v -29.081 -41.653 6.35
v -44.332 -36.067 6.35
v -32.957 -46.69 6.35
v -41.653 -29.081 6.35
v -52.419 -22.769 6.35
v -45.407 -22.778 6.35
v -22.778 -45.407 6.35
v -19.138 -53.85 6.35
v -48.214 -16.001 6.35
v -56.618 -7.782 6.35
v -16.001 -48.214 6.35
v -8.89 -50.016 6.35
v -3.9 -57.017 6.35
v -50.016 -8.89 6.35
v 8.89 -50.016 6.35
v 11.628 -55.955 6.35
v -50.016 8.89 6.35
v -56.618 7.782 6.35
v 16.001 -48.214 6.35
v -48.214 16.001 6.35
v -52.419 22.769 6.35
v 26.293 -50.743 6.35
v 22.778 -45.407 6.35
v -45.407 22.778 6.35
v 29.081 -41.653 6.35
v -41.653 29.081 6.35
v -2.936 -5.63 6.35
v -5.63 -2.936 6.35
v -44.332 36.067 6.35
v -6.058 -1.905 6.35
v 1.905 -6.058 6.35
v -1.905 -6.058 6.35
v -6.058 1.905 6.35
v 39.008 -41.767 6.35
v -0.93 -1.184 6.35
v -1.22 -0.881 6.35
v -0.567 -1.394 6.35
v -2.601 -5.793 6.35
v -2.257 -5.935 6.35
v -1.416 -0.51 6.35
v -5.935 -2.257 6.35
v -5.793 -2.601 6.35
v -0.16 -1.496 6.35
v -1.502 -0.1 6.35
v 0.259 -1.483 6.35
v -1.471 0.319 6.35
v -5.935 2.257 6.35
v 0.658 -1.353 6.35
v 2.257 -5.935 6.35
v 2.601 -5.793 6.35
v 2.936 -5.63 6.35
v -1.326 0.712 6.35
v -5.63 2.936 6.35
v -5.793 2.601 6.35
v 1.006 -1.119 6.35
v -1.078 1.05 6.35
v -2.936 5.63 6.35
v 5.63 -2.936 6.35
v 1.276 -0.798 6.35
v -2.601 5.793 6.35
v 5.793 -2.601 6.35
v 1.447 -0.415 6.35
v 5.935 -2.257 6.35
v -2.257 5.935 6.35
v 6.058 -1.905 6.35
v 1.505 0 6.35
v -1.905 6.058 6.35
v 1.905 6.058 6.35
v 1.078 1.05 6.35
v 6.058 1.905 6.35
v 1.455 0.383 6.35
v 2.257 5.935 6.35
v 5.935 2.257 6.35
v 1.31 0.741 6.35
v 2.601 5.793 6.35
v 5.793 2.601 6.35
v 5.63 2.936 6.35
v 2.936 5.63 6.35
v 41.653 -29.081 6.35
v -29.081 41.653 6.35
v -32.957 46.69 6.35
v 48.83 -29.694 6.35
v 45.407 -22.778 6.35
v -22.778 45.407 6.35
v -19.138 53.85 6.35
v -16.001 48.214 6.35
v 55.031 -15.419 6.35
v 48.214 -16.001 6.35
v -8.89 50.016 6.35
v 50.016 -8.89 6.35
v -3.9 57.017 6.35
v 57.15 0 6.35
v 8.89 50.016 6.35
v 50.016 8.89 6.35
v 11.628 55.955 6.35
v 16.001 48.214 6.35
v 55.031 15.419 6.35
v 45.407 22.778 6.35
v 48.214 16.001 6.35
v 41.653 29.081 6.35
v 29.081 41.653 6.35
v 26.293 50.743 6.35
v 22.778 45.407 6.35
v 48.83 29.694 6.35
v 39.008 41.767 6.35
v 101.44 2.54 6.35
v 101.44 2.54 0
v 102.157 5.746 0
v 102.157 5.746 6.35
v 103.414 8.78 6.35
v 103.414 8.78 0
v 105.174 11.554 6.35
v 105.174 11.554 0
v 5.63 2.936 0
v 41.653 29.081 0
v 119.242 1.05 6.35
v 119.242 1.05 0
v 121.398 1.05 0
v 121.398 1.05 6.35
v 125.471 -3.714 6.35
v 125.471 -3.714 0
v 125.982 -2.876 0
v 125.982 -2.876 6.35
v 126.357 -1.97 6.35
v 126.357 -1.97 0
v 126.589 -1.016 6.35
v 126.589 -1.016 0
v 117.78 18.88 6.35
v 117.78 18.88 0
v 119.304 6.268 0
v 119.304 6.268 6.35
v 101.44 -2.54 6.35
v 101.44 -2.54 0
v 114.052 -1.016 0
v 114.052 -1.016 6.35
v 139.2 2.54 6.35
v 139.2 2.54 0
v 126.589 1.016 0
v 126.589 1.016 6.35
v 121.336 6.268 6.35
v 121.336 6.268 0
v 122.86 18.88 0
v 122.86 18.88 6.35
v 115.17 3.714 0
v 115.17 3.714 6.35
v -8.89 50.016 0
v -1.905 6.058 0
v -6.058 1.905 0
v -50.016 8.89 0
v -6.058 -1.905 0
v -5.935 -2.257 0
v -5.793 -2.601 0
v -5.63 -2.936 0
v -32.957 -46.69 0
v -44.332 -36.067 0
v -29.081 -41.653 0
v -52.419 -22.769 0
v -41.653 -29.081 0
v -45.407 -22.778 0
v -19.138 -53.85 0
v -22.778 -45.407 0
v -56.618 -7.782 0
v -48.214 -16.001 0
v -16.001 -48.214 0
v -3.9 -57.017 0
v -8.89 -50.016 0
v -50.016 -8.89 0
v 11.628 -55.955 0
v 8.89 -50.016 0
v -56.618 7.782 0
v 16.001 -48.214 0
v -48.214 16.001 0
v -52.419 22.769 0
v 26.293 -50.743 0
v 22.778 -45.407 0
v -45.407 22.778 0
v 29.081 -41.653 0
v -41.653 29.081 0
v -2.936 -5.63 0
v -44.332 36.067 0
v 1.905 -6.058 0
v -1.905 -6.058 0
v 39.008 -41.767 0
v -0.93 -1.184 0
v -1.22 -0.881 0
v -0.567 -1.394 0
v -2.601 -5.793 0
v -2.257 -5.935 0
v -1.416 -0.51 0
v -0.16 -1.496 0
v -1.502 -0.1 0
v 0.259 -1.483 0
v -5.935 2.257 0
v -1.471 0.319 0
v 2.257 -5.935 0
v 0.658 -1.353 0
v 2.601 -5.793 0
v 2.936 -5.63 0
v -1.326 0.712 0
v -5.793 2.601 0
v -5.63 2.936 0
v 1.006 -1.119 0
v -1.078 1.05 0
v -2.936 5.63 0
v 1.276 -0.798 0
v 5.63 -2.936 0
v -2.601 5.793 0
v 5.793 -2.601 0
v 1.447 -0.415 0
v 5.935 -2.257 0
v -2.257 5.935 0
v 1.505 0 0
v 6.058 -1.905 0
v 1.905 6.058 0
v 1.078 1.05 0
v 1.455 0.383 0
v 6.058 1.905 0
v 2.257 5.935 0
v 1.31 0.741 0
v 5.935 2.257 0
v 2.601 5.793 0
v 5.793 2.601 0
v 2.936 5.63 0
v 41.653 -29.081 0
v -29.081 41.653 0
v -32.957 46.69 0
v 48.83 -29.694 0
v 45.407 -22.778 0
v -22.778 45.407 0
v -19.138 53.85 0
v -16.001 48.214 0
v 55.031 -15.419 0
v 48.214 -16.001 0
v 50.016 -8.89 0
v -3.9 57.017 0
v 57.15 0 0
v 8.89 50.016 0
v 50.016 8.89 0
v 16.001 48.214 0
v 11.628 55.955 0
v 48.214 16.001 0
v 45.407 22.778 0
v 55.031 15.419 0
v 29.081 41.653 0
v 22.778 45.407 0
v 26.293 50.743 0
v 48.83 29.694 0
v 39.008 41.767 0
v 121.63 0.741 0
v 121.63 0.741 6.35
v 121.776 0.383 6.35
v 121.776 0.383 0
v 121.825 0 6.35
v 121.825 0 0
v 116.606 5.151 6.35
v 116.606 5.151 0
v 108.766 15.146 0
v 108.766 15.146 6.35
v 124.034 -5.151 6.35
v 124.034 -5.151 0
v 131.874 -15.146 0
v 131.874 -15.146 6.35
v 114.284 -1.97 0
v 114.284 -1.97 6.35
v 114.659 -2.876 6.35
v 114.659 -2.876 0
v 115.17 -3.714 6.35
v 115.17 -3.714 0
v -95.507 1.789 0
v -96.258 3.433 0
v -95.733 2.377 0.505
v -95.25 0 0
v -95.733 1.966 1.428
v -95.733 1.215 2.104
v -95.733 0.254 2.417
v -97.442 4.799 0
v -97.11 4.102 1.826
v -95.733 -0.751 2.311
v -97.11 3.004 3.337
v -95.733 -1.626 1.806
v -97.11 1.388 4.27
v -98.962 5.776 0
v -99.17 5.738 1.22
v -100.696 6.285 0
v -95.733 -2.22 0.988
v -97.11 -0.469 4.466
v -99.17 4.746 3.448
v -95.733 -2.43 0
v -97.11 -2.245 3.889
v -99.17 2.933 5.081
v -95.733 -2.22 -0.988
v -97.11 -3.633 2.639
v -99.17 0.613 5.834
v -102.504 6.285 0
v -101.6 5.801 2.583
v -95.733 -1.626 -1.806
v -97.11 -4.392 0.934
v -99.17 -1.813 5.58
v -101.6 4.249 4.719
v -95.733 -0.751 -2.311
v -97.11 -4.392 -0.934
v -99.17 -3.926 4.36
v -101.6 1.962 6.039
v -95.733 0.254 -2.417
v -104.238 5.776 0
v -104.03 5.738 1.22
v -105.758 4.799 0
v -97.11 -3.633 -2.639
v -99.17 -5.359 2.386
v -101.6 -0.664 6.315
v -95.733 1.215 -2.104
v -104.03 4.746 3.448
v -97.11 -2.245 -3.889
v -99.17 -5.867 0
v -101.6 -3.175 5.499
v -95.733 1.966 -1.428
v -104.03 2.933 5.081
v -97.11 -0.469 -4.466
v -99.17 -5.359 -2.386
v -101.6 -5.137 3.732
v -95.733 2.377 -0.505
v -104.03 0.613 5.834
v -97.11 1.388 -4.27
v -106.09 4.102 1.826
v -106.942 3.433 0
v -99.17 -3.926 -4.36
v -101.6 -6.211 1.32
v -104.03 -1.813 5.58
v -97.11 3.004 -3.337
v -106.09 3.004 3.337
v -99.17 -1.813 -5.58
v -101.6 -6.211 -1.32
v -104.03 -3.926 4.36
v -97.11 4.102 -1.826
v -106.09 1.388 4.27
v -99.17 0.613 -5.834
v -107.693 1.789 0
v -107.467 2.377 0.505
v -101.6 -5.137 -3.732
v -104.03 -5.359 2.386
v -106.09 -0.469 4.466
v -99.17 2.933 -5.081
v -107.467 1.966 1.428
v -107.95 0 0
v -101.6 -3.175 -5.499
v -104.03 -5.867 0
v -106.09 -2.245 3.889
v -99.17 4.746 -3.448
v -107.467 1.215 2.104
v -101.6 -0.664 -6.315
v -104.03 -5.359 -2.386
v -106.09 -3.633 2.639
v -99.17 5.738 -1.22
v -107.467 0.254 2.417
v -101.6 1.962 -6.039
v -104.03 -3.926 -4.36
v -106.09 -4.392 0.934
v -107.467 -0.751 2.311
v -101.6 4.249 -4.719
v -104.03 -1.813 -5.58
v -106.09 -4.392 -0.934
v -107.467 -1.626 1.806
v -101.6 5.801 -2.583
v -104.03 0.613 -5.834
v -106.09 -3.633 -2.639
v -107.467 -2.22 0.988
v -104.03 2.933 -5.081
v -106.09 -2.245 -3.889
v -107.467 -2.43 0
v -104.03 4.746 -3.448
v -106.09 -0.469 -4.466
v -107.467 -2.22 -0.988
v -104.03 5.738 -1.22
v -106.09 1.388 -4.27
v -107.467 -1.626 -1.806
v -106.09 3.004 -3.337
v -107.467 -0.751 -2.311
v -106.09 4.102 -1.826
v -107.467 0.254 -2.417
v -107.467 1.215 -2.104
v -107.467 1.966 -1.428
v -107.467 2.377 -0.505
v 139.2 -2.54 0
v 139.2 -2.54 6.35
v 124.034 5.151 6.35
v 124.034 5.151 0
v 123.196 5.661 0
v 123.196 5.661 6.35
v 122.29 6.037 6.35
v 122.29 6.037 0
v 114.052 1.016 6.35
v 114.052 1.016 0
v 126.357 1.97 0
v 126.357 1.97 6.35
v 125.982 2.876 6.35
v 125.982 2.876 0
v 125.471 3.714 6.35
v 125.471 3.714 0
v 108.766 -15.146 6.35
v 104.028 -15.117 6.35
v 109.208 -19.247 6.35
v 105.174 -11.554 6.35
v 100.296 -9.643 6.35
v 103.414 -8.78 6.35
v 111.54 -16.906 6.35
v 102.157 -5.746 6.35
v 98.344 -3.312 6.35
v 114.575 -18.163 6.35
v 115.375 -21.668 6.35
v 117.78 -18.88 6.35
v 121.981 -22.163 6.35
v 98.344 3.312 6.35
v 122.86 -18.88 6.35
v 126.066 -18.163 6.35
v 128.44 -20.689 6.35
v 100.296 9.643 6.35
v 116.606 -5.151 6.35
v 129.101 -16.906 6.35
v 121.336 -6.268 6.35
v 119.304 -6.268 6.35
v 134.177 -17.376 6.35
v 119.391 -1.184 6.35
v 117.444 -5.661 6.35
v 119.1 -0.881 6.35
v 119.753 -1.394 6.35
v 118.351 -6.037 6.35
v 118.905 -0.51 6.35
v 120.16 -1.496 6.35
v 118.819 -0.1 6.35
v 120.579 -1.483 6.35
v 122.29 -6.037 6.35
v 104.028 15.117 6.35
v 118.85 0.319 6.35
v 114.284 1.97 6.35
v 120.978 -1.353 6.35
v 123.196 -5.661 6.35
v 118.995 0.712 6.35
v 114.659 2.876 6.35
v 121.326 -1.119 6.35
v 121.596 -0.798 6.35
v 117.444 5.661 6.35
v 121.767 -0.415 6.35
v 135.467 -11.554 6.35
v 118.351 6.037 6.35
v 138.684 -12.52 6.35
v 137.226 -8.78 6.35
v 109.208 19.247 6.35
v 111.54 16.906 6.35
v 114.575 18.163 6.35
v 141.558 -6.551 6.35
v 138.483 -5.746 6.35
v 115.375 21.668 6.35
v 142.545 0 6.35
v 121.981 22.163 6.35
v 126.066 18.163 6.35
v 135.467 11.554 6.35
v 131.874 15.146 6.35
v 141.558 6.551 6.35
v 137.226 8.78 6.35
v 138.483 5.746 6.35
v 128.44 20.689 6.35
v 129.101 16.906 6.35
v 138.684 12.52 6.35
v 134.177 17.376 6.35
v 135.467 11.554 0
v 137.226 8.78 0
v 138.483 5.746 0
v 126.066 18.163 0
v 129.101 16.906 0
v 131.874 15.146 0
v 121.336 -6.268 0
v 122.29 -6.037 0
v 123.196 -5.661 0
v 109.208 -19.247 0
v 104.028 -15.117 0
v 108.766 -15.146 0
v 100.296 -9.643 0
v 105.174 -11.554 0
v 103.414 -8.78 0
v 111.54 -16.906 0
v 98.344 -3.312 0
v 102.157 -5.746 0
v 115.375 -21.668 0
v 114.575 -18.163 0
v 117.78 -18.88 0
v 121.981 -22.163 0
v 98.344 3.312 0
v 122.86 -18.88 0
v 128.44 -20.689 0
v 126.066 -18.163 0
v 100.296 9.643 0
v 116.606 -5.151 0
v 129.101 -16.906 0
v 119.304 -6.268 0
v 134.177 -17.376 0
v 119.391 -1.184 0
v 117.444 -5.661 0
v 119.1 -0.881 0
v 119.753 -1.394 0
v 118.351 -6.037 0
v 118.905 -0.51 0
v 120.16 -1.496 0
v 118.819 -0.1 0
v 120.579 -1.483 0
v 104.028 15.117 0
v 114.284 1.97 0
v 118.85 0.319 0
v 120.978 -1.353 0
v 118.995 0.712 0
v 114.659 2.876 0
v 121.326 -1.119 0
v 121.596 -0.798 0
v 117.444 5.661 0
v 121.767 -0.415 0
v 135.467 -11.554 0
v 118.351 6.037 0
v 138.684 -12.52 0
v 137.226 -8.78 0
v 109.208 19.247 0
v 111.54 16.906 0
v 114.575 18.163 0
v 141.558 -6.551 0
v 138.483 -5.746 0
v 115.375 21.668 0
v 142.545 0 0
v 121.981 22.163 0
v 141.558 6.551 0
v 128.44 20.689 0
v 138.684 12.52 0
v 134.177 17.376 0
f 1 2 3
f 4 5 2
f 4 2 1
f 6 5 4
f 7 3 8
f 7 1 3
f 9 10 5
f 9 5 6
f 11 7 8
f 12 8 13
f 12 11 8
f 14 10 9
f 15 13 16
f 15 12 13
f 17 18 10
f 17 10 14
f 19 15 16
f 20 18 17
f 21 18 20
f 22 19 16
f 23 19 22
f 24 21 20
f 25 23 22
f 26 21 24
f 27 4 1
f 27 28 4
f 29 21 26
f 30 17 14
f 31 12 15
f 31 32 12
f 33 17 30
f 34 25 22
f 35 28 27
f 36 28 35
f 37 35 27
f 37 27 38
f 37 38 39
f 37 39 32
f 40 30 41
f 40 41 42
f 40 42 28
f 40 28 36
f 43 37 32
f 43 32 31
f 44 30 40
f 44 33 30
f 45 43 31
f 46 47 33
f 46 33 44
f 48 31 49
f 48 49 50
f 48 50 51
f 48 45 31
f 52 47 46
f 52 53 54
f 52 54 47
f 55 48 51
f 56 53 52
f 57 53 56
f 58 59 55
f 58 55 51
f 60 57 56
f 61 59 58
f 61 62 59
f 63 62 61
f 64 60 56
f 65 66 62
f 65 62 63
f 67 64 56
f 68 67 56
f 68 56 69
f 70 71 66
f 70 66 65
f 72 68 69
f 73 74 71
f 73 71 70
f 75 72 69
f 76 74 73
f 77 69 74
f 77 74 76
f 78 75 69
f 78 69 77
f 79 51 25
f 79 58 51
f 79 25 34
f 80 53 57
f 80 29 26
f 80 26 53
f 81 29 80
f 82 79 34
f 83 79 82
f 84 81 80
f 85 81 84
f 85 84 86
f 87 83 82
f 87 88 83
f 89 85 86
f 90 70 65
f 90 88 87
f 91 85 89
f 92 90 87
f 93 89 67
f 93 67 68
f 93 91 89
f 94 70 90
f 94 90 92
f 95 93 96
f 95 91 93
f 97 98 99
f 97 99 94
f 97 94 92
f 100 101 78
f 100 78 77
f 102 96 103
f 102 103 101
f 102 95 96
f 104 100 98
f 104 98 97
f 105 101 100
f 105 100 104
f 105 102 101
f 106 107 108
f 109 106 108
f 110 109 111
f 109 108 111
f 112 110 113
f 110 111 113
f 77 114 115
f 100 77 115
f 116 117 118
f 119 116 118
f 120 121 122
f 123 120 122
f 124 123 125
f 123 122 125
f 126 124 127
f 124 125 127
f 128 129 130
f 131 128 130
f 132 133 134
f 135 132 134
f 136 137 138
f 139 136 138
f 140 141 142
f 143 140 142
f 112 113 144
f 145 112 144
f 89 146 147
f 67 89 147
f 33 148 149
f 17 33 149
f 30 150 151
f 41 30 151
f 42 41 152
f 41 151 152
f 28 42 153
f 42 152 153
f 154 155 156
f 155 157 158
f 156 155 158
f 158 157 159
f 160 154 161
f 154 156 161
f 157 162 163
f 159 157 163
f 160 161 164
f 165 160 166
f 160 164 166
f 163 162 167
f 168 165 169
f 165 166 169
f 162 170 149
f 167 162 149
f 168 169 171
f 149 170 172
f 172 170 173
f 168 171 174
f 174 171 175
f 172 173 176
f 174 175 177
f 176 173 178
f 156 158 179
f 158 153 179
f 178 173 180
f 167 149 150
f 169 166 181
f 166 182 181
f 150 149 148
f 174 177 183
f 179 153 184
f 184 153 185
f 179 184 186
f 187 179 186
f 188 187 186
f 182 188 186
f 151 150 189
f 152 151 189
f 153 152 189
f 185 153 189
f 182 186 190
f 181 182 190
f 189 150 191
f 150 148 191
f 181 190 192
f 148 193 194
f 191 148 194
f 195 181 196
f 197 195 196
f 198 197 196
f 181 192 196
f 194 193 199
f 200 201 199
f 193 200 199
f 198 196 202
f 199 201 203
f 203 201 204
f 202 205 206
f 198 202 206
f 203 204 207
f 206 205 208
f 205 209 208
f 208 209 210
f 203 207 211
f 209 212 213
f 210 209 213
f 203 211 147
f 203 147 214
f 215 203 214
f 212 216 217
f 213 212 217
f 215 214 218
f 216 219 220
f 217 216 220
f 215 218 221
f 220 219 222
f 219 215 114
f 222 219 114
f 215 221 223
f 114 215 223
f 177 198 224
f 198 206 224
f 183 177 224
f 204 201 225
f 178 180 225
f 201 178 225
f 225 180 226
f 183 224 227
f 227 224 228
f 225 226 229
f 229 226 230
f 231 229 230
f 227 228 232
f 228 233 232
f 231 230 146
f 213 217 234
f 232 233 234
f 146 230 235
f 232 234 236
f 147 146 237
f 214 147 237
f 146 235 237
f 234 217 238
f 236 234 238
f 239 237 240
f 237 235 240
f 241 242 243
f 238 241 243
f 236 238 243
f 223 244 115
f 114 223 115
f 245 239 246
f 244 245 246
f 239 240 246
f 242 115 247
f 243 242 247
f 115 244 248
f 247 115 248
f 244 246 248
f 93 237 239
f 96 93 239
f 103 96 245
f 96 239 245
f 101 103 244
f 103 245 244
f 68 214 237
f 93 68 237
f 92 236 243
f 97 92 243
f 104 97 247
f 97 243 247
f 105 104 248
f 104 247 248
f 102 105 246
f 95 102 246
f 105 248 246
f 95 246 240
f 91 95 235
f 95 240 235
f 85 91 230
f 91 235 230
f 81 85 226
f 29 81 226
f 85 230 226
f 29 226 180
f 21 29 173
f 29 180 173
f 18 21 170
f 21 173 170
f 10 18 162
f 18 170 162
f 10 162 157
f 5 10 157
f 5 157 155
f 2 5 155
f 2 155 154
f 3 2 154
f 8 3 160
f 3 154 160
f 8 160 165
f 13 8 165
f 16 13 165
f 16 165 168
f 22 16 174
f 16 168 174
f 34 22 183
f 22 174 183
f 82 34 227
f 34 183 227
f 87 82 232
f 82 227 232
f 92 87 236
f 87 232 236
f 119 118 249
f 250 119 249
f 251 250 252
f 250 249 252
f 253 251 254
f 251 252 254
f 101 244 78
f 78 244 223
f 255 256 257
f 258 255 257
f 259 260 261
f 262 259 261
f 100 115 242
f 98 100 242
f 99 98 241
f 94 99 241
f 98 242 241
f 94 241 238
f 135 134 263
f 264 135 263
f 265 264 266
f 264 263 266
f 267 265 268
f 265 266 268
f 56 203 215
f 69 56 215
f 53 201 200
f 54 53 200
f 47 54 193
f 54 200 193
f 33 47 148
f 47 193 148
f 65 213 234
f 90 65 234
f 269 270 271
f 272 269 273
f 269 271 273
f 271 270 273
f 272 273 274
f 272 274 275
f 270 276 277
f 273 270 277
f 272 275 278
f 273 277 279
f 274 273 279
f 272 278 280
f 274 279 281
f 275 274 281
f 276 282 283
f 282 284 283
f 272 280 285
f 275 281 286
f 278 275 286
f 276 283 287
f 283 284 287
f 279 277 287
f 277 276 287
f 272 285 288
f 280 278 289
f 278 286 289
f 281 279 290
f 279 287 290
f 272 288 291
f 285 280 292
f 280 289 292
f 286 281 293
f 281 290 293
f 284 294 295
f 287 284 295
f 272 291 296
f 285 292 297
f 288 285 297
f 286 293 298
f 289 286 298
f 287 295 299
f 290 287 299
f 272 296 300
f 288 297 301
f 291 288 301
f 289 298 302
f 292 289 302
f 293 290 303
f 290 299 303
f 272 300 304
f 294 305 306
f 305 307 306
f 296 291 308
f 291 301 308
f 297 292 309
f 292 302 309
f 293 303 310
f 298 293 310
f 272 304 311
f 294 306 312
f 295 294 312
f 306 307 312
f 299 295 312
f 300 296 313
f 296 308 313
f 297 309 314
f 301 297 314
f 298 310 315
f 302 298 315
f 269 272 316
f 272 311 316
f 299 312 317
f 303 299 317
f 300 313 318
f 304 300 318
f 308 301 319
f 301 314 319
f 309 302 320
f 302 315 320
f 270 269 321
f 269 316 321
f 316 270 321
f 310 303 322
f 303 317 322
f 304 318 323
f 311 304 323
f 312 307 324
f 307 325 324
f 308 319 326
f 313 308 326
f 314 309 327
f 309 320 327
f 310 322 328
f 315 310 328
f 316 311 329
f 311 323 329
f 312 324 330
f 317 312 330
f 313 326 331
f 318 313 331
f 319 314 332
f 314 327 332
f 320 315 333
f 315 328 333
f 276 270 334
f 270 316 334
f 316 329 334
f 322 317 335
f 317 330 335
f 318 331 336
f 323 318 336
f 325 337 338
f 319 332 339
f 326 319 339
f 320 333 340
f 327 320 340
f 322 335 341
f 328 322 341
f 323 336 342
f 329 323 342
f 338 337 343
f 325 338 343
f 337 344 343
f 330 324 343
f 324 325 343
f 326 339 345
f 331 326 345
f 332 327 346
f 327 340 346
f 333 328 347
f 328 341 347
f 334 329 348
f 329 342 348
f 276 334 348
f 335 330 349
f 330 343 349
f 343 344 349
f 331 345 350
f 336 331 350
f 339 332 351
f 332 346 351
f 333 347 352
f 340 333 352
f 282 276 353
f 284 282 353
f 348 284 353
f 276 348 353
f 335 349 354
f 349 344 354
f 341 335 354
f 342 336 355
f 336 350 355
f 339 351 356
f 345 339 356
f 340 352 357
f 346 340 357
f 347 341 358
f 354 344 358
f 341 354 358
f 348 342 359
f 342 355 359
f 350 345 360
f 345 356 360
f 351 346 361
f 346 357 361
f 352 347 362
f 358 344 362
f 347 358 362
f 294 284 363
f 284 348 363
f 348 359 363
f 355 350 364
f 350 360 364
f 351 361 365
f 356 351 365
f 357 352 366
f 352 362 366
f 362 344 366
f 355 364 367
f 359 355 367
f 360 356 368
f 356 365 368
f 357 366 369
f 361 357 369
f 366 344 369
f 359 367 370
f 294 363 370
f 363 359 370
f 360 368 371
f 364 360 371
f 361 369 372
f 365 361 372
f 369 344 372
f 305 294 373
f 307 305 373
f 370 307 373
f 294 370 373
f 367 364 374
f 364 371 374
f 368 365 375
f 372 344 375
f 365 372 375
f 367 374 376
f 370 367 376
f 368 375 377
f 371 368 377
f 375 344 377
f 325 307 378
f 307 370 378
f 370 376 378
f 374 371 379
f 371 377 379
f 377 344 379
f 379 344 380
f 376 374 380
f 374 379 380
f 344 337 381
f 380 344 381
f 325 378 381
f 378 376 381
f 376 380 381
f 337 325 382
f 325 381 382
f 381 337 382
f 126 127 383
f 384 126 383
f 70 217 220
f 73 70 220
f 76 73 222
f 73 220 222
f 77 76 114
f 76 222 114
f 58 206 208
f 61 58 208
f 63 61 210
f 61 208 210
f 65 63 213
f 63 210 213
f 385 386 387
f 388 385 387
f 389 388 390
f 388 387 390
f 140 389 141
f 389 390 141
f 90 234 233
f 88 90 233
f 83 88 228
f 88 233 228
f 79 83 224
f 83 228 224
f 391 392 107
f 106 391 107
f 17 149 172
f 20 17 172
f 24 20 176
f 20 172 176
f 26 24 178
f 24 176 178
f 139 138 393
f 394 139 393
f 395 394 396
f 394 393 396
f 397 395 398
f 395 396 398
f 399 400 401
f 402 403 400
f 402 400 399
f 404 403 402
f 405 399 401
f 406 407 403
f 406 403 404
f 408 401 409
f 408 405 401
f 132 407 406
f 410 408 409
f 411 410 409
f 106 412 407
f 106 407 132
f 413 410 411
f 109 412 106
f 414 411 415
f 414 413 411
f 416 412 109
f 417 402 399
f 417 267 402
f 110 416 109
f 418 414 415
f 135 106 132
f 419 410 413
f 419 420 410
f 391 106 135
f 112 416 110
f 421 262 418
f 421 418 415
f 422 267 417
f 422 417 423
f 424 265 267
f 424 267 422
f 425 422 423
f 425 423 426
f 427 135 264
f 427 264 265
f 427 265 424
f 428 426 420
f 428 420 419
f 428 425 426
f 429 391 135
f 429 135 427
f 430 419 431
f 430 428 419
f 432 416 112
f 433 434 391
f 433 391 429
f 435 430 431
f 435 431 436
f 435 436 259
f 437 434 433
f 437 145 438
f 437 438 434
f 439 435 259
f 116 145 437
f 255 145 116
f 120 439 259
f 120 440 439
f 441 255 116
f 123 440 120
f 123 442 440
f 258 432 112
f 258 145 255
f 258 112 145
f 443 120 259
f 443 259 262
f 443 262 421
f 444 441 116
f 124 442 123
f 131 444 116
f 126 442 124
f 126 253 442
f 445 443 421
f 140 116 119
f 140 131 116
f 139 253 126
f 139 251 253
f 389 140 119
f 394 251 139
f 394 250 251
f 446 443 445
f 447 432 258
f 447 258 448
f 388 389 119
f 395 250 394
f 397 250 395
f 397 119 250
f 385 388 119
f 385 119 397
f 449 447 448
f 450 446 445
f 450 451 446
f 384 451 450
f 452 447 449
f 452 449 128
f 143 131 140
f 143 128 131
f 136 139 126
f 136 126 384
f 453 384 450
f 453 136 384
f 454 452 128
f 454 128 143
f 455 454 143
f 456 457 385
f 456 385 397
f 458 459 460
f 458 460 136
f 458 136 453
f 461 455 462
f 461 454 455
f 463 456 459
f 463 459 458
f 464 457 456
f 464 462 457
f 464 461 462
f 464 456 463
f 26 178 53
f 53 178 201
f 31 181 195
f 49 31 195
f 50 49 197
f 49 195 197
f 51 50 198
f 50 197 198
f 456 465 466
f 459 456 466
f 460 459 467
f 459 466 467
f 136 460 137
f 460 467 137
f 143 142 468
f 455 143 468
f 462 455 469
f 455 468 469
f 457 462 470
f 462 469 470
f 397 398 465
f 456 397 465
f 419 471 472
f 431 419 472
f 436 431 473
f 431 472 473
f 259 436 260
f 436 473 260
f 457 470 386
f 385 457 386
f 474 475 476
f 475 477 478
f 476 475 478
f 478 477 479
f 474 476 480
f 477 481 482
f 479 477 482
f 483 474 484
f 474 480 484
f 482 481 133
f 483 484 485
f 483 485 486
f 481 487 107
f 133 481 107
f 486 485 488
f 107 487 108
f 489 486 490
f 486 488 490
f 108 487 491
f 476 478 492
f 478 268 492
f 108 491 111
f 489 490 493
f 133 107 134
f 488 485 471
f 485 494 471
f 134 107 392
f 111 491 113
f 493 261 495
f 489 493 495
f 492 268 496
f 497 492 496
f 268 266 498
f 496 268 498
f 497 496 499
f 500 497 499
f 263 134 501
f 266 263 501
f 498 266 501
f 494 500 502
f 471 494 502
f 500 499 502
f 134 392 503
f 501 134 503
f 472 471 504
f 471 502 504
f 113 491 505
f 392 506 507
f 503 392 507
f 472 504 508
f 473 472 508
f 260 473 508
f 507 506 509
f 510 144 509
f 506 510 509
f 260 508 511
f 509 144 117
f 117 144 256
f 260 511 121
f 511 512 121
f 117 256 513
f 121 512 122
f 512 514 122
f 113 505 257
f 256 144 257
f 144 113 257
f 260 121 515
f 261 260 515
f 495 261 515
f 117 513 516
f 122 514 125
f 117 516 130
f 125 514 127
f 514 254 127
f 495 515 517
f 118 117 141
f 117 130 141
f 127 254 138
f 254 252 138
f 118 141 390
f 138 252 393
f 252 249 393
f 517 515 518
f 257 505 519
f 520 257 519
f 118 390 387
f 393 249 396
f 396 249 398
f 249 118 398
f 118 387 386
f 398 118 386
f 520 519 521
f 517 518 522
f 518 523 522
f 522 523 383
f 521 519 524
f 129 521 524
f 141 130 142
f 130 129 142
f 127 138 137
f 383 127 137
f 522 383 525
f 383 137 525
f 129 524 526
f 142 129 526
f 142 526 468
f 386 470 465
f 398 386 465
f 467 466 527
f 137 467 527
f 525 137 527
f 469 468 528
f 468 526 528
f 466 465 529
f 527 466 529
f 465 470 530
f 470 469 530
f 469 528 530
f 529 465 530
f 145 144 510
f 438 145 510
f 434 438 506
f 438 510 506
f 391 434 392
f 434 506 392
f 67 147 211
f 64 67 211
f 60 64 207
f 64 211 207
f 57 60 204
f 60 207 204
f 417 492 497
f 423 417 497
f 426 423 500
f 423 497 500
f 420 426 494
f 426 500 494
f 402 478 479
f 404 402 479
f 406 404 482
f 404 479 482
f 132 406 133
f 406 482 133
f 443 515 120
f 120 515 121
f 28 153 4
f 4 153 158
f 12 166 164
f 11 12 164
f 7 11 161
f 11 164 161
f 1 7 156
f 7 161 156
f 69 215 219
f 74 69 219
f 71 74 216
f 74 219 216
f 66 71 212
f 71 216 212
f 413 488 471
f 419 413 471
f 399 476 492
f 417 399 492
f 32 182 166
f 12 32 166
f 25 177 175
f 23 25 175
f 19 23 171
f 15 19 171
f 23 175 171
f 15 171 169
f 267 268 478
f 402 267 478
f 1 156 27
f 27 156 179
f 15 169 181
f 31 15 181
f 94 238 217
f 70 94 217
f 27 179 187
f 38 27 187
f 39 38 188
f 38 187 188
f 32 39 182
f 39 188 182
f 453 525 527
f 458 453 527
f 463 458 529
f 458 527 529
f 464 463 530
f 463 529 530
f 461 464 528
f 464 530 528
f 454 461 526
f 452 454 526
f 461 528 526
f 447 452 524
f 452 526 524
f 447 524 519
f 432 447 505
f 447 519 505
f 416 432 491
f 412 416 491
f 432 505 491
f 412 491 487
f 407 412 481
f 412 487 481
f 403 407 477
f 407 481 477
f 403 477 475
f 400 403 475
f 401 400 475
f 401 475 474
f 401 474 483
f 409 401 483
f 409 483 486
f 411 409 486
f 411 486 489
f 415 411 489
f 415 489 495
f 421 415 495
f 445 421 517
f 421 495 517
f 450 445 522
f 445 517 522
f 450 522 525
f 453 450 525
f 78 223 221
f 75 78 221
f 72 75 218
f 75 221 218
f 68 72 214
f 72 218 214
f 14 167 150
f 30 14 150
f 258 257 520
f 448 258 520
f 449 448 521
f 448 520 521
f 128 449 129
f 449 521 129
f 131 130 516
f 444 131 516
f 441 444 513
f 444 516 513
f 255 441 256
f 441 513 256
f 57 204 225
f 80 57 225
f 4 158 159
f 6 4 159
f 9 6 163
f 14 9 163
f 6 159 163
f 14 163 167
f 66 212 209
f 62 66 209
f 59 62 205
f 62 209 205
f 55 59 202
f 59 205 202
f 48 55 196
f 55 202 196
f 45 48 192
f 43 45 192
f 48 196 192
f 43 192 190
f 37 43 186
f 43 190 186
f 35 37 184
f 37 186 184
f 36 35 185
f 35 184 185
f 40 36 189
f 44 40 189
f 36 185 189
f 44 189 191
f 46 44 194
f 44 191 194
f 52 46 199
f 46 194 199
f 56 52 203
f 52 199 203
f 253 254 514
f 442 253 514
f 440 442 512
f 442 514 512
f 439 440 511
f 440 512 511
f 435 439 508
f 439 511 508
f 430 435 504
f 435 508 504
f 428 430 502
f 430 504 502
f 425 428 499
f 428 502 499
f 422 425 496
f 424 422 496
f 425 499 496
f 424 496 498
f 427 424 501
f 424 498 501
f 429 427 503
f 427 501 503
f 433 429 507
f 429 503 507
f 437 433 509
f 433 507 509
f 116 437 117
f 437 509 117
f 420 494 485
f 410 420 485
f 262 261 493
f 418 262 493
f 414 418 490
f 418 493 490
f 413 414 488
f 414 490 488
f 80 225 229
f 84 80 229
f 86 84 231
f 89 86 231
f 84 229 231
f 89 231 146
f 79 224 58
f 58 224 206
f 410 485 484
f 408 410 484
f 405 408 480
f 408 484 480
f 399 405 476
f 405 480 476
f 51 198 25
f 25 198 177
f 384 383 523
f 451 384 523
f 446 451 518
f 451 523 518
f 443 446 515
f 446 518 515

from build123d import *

# Parameters (mm, degrees)
F0_R     = 57.15
F1_DEPTH = 6.35
F0_R_2   = 22.225


with BuildPart() as f1:
    # F0 (on Top) → F1 (new body)
    with BuildSketch(Plane.XY):
        Circle(F0_R)
        with BuildLine():
            ThreePointArc((41.6528860865, 29.080527517), (46.9330802516, 19.4403183641), (50.0160764155, 8.89))
            ThreePointArc((50.0160764155, 8.89), (50.6036396018, 4.4622482054), (50.8, 0))
            ThreePointArc((50.8, 0), (50.6036396018, -4.4622482054), (50.0160764155, -8.89))
            ThreePointArc((50.0160764155, -8.89), (46.9330802516, -19.4403183641), (41.6528860865, -29.080527517))
            ThreePointArc((41.6528860865, -29.080527517), (35.9210244843, -35.9210244843), (29.080527517, -41.6528860865))
            ThreePointArc((29.080527517, -41.6528860865), (19.4403183641, -46.9330802516), (8.89, -50.0160764155))
            ThreePointArc((8.89, -50.0160764155), (0, -50.8), (-8.89, -50.0160764155))
            ThreePointArc((-8.89, -50.0160764155), (-19.4403183641, -46.9330802516), (-29.080527517, -41.6528860865))
            ThreePointArc((-29.080527517, -41.6528860865), (-35.9210244843, -35.9210244843), (-41.6528860865, -29.080527517))
            ThreePointArc((-41.6528860865, -29.080527517), (-46.9330802516, -19.4403183641), (-50.0160764155, -8.89))
            ThreePointArc((-50.0160764155, -8.89), (-50.8, 0), (-50.0160764155, 8.89))
            ThreePointArc((-50.0160764155, 8.89), (-46.9330802516, 19.4403183641), (-41.6528860865, 29.080527517))
            ThreePointArc((-41.6528860865, 29.080527517), (-35.9210244843, 35.9210244843), (-29.080527517, 41.6528860865))
            ThreePointArc((-29.080527517, 41.6528860865), (-19.4403183641, 46.9330802516), (-8.89, 50.0160764155))
            ThreePointArc((-8.89, 50.0160764155), (0, 50.8), (8.89, 50.0160764155))
            ThreePointArc((8.89, 50.0160764155), (19.4403183641, 46.9330802516), (29.080527517, 41.6528860865))
            ThreePointArc((29.080527517, 41.6528860865), (35.9210244843, 35.9210244843), (41.6528860865, 29.080527517))
        make_face(mode=Mode.SUBTRACT)
        with BuildLine():
            ThreePointArc((-5.6303475945, 2.9362707582), (-4.4901280605, 4.4901280605), (-2.9362707582, 5.6303475945))
            Line((-2.9362707582, 5.6303475945), (-29.080527517, 41.6528860865))
            ThreePointArc((-29.080527517, 41.6528860865), (-35.9210244843, 35.9210244843), (-41.6528860865, 29.080527517))
            Line((-41.6528860865, 29.080527517), (-5.6303475945, 2.9362707582))
        make_face()
        with BuildLine():
            ThreePointArc((6.057513929, -1.905), (6.2764525589, -0.9636613904), (6.35, 0))
            ThreePointArc((6.35, 0), (6.2764525589, 0.9636613904), (6.057513929, 1.905))
            ThreePointArc((6.057513929, 1.905), (5.8666350314, 2.4300397955), (5.6303475945, 2.9362707582))
            ThreePointArc((5.6303475945, 2.9362707582), (4.4901280605, 4.4901280605), (2.9362707582, 5.6303475945))
            ThreePointArc((2.9362707582, 5.6303475945), (2.4300397955, 5.8666350314), (1.905, 6.057513929))
            ThreePointArc((1.905, 6.057513929), (0, 6.35), (-1.905, 6.057513929))
            ThreePointArc((-1.905, 6.057513929), (-2.4300397955, 5.8666350314), (-2.9362707582, 5.6303475945))
            ThreePointArc((-2.9362707582, 5.6303475945), (-4.4901280605, 4.4901280605), (-5.6303475945, 2.9362707582))
            ThreePointArc((-5.6303475945, 2.9362707582), (-5.8666350314, 2.4300397955), (-6.057513929, 1.905))
            ThreePointArc((-6.057513929, 1.905), (-6.35, 0), (-6.057513929, -1.905))
            ThreePointArc((-6.057513929, -1.905), (-5.8666350314, -2.4300397955), (-5.6303475945, -2.9362707582))
            ThreePointArc((-5.6303475945, -2.9362707582), (-4.4901280605, -4.4901280605), (-2.9362707582, -5.6303475945))
            ThreePointArc((-2.9362707582, -5.6303475945), (-2.4300397955, -5.8666350314), (-1.905, -6.057513929))
            ThreePointArc((-1.905, -6.057513929), (0, -6.35), (1.905, -6.057513929))
            ThreePointArc((1.905, -6.057513929), (2.4300397955, -5.8666350314), (2.9362707582, -5.6303475945))
            ThreePointArc((2.9362707582, -5.6303475945), (4.4901280605, -4.4901280605), (5.6303475945, -2.9362707582))
            ThreePointArc((5.6303475945, -2.9362707582), (5.8666350314, -2.4300397955), (6.057513929, -1.905))
        make_face()
        with BuildLine():
            ThreePointArc((1.0778522248, 1.05029), (1.3940925737, 0.5669042233), (1.50495, 0))
            ThreePointArc((1.50495, 0), (-0.5669042233, -1.3940925737), (-1.0778522248, 1.05029))
            ThreePointArc((-1.0778522248, 1.05029), (0, 1.50495), (1.0778522248, 1.05029))
        make_face(mode=Mode.SUBTRACT)
        with BuildLine():
            ThreePointArc((-1.905, 6.057513929), (0, 6.35), (1.905, 6.057513929))
            Line((1.905, 6.057513929), (8.89, 50.0160764155))
            ThreePointArc((8.89, 50.0160764155), (0, 50.8), (-8.89, 50.0160764155))
            Line((-8.89, 50.0160764155), (-1.905, 6.057513929))
        make_face()
        with BuildLine():
            ThreePointArc((6.057513929, 1.905), (6.2764525589, 0.9636613904), (6.35, 0))
            ThreePointArc((6.35, 0), (6.2764525589, -0.9636613904), (6.057513929, -1.905))
            Line((6.057513929, -1.905), (50.0160764155, -8.89))
            ThreePointArc((50.0160764155, -8.89), (50.6036396018, -4.4622482054), (50.8, 0))
            ThreePointArc((50.8, 0), (50.6036396018, 4.4622482054), (50.0160764155, 8.89))
            Line((50.0160764155, 8.89), (6.057513929, 1.905))
        make_face()
        with BuildLine():
            Line((41.6528860865, -29.080527517), (5.6303475945, -2.9362707582))
            ThreePointArc((5.6303475945, -2.9362707582), (4.4901280605, -4.4901280605), (2.9362707582, -5.6303475945))
            Line((2.9362707582, -5.6303475945), (29.080527517, -41.6528860865))
            ThreePointArc((29.080527517, -41.6528860865), (35.9210244843, -35.9210244843), (41.6528860865, -29.080527517))
        make_face()
        with BuildLine():
            Line((8.89, -50.0160764155), (1.905, -6.057513929))
            ThreePointArc((1.905, -6.057513929), (0, -6.35), (-1.905, -6.057513929))
            Line((-1.905, -6.057513929), (-8.89, -50.0160764155))
            ThreePointArc((-8.89, -50.0160764155), (0, -50.8), (8.89, -50.0160764155))
        make_face()
        with BuildLine():
            Line((-29.080527517, -41.6528860865), (-2.9362707582, -5.6303475945))
            ThreePointArc((-2.9362707582, -5.6303475945), (-4.4901280605, -4.4901280605), (-5.6303475945, -2.9362707582))
            Line((-5.6303475945, -2.9362707582), (-41.6528860865, -29.080527517))
            ThreePointArc((-41.6528860865, -29.080527517), (-35.9210244843, -35.9210244843), (-29.080527517, -41.6528860865))
        make_face()
        with BuildLine():
            ThreePointArc((-6.057513929, -1.905), (-6.35, 0), (-6.057513929, 1.905))
            Line((-6.057513929, 1.905), (-50.0160764155, 8.89))
            ThreePointArc((-50.0160764155, 8.89), (-50.8, 0), (-50.0160764155, -8.89))
            Line((-50.0160764155, -8.89), (-6.057513929, -1.905))
        make_face()
        with BuildLine():
            ThreePointArc((2.9362707582, 5.6303475945), (4.4901280605, 4.4901280605), (5.6303475945, 2.9362707582))
            Line((5.6303475945, 2.9362707582), (41.6528860865, 29.080527517))
            ThreePointArc((41.6528860865, 29.080527517), (35.9210244843, 35.9210244843), (29.080527517, 41.6528860865))
            Line((29.080527517, 41.6528860865), (2.9362707582, 5.6303475945))
        make_face()
        with BuildLine():
            Line((-1.0778522248, 1.05029), (1.0778522248, 1.05029))
            ThreePointArc((1.0778522248, 1.05029), (0, 1.50495), (-1.0778522248, 1.05029))
        make_face()
    extrude(amount=F1_DEPTH)


with BuildPart() as f1b:
    # F0 (on Top) → F1, piece 2 (new body)
    with BuildSketch(Plane.XY):
        with Locations((120.3203499317, 0)):
            Circle(F0_R_2)
        with BuildLine():
            ThreePointArc((135.4665116424, 11.5540592622), (137.9202550261, 7.2901193866), (139.2002572408, 2.54))
            ThreePointArc((139.2002572408, 2.54), (139.3277791929, 1.2728444056), (139.3703499317, 0))
            ThreePointArc((139.3703499317, 0), (139.3277791929, -1.2728444056), (139.2002572408, -2.54))
            ThreePointArc((139.2002572408, -2.54), (137.9202550261, -7.2901193866), (135.4665116424, -11.5540592622))
            ThreePointArc((135.4665116424, -11.5540592622), (133.7907341133, -13.4703841816), (131.8744091939, -15.1461617106))
            ThreePointArc((131.8744091939, -15.1461617106), (127.6104693183, -17.5999050943), (122.8603499317, -18.8799073091))
            ThreePointArc((122.8603499317, -18.8799073091), (120.3203499317, -19.05), (117.7803499317, -18.8799073091))
            ThreePointArc((117.7803499317, -18.8799073091), (113.0302305452, -17.5999050943), (108.7662906695, -15.1461617106))
            ThreePointArc((108.7662906695, -15.1461617106), (106.8499657501, -13.4703841816), (105.1741882211, -11.5540592622))
            ThreePointArc((105.1741882211, -11.5540592622), (102.7204448374, -7.2901193866), (101.4404426226, -2.54))
            ThreePointArc((101.4404426226, -2.54), (101.2703499317, 0), (101.4404426226, 2.54))
            ThreePointArc((101.4404426226, 2.54), (102.7204448374, 7.2901193866), (105.1741882211, 11.5540592622))
            ThreePointArc((105.1741882211, 11.5540592622), (106.8499657501, 13.4703841816), (108.7662906695, 15.1461617106))
            ThreePointArc((108.7662906695, 15.1461617106), (113.0302305452, 17.5999050943), (117.7803499317, 18.8799073091))
            ThreePointArc((117.7803499317, 18.8799073091), (120.3203499317, 19.05), (122.8603499317, 18.8799073091))
            ThreePointArc((122.8603499317, 18.8799073091), (127.6104693183, 17.5999050943), (131.8744091939, 15.1461617106))
            ThreePointArc((131.8744091939, 15.1461617106), (133.7907341133, 13.4703841816), (135.4665116424, 11.5540592622))
        make_face(mode=Mode.SUBTRACT)
        with BuildLine():
            ThreePointArc((126.5885429728, -1.016), (126.6498651505, -0.5096440862), (126.6703499317, 0))
            ThreePointArc((126.6703499317, 0), (126.6498651505, 0.5096440862), (126.5885429728, 1.016))
            ThreePointArc((126.5885429728, 1.016), (126.1869849632, 2.4300397955), (125.4710522265, 3.7138613154))
            ThreePointArc((125.4710522265, 3.7138613154), (124.8104779923, 4.4901280605), (124.0342112472, 5.1507022948))
            ThreePointArc((124.0342112472, 5.1507022948), (122.7503897272, 5.8666350314), (121.3363499317, 6.2681930411))
            ThreePointArc((121.3363499317, 6.2681930411), (120.3203499317, 6.35), (119.3043499317, 6.2681930411))
            ThreePointArc((119.3043499317, 6.2681930411), (117.8903101362, 5.8666350314), (116.6064886163, 5.1507022948))
            ThreePointArc((116.6064886163, 5.1507022948), (115.8302218712, 4.4901280605), (115.1696476369, 3.7138613154))
            ThreePointArc((115.1696476369, 3.7138613154), (114.4537149003, 2.4300397955), (114.0521568907, 1.016))
            ThreePointArc((114.0521568907, 1.016), (113.9703499317, 0), (114.0521568907, -1.016))
            ThreePointArc((114.0521568907, -1.016), (114.4537149003, -2.4300397955), (115.1696476369, -3.7138613154))
            ThreePointArc((115.1696476369, -3.7138613154), (115.8302218712, -4.4901280605), (116.6064886163, -5.1507022948))
            ThreePointArc((116.6064886163, -5.1507022948), (117.8903101362, -5.8666350314), (119.3043499317, -6.2681930411))
            ThreePointArc((119.3043499317, -6.2681930411), (120.3203499317, -6.35), (121.3363499317, -6.2681930411))
            ThreePointArc((121.3363499317, -6.2681930411), (122.7503897272, -5.8666350314), (124.0342112472, -5.1507022948))
            ThreePointArc((124.0342112472, -5.1507022948), (124.8104779923, -4.4901280605), (125.4710522265, -3.7138613154))
            ThreePointArc((125.4710522265, -3.7138613154), (126.1869849632, -2.4300397955), (126.5885429728, -1.016))
        make_face()
        with BuildLine():
            ThreePointArc((121.3982021565, 1.05029), (121.7144425054, 0.5669042233), (121.8252999317, 0))
            ThreePointArc((121.8252999317, 0), (119.7534457084, -1.3940925737), (119.242497707, 1.05029))
            ThreePointArc((119.242497707, 1.05029), (120.3203499317, 1.50495), (121.3982021565, 1.05029))
        make_face(mode=Mode.SUBTRACT)
        with BuildLine():
            ThreePointArc((119.3043499317, 6.2681930411), (120.3203499317, 6.35), (121.3363499317, 6.2681930411))
            Line((121.3363499317, 6.2681930411), (122.8603499317, 18.8799073091))
            ThreePointArc((122.8603499317, 18.8799073091), (120.3203499317, 19.05), (117.7803499317, 18.8799073091))
            Line((117.7803499317, 18.8799073091), (119.3043499317, 6.2681930411))
        make_face()
        with BuildLine():
            ThreePointArc((115.1696476369, 3.7138613154), (115.8302218712, 4.4901280605), (116.6064886163, 5.1507022948))
            Line((116.6064886163, 5.1507022948), (108.7662906695, 15.1461617106))
            ThreePointArc((108.7662906695, 15.1461617106), (106.8499657501, 13.4703841816), (105.1741882211, 11.5540592622))
            Line((105.1741882211, 11.5540592622), (115.1696476369, 3.7138613154))
        make_face()
        with BuildLine():
            ThreePointArc((114.0521568907, -1.016), (113.9703499317, 0), (114.0521568907, 1.016))
            Line((114.0521568907, 1.016), (101.4404426226, 2.54))
            ThreePointArc((101.4404426226, 2.54), (101.2703499317, 0), (101.4404426226, -2.54))
            Line((101.4404426226, -2.54), (114.0521568907, -1.016))
        make_face()
        with BuildLine():
            Line((108.7662906695, -15.1461617106), (116.6064886163, -5.1507022948))
            ThreePointArc((116.6064886163, -5.1507022948), (115.8302218712, -4.4901280605), (115.1696476369, -3.7138613154))
            Line((115.1696476369, -3.7138613154), (105.1741882211, -11.5540592622))
            ThreePointArc((105.1741882211, -11.5540592622), (106.8499657501, -13.4703841816), (108.7662906695, -15.1461617106))
        make_face()
        with BuildLine():
            Line((122.8603499317, -18.8799073091), (121.3363499317, -6.2681930411))
            ThreePointArc((121.3363499317, -6.2681930411), (120.3203499317, -6.35), (119.3043499317, -6.2681930411))
            Line((119.3043499317, -6.2681930411), (117.7803499317, -18.8799073091))
            ThreePointArc((117.7803499317, -18.8799073091), (120.3203499317, -19.05), (122.8603499317, -18.8799073091))
        make_face()
        with BuildLine():
            Line((135.4665116424, -11.5540592622), (125.4710522265, -3.7138613154))
            ThreePointArc((125.4710522265, -3.7138613154), (124.8104779923, -4.4901280605), (124.0342112472, -5.1507022948))
            Line((124.0342112472, -5.1507022948), (131.8744091939, -15.1461617106))
            ThreePointArc((131.8744091939, -15.1461617106), (133.7907341133, -13.4703841816), (135.4665116424, -11.5540592622))
        make_face()
        with BuildLine():
            ThreePointArc((126.5885429728, 1.016), (126.6498651505, 0.5096440862), (126.6703499317, 0))
            ThreePointArc((126.6703499317, 0), (126.6498651505, -0.5096440862), (126.5885429728, -1.016))
            Line((126.5885429728, -1.016), (139.2002572408, -2.54))
            ThreePointArc((139.2002572408, -2.54), (139.3277791929, -1.2728444056), (139.3703499317, 0))
            ThreePointArc((139.3703499317, 0), (139.3277791929, 1.2728444056), (139.2002572408, 2.54))
            Line((139.2002572408, 2.54), (126.5885429728, 1.016))
        make_face()
        with BuildLine():
            ThreePointArc((124.0342112472, 5.1507022948), (124.8104779923, 4.4901280605), (125.4710522265, 3.7138613154))
            Line((125.4710522265, 3.7138613154), (135.4665116424, 11.5540592622))
            ThreePointArc((135.4665116424, 11.5540592622), (133.7907341133, 13.4703841816), (131.8744091939, 15.1461617106))
            Line((131.8744091939, 15.1461617106), (124.0342112472, 5.1507022948))
        make_face()
        with BuildLine():
            Line((119.242497707, 1.05029), (121.3982021565, 1.05029))
            ThreePointArc((121.3982021565, 1.05029), (120.3203499317, 1.50495), (119.242497707, 1.05029))
        make_face()
    extrude(amount=F1_DEPTH)


with BuildPart() as f2:
    # F0 (on Top) → F2 (revolve)
    with BuildSketch(Plane.XY):
        with BuildLine():
            Line((-107.95, 0), (-95.25, 0))
            ThreePointArc((-95.25, 0), (-101.6, 6.35), (-107.95, 0))
        make_face()
    revolve(axis=Axis((-101.6, 0, 0), (1, 0, 0)))


solid = Compound([f1.part, f1b.part, f2.part])
